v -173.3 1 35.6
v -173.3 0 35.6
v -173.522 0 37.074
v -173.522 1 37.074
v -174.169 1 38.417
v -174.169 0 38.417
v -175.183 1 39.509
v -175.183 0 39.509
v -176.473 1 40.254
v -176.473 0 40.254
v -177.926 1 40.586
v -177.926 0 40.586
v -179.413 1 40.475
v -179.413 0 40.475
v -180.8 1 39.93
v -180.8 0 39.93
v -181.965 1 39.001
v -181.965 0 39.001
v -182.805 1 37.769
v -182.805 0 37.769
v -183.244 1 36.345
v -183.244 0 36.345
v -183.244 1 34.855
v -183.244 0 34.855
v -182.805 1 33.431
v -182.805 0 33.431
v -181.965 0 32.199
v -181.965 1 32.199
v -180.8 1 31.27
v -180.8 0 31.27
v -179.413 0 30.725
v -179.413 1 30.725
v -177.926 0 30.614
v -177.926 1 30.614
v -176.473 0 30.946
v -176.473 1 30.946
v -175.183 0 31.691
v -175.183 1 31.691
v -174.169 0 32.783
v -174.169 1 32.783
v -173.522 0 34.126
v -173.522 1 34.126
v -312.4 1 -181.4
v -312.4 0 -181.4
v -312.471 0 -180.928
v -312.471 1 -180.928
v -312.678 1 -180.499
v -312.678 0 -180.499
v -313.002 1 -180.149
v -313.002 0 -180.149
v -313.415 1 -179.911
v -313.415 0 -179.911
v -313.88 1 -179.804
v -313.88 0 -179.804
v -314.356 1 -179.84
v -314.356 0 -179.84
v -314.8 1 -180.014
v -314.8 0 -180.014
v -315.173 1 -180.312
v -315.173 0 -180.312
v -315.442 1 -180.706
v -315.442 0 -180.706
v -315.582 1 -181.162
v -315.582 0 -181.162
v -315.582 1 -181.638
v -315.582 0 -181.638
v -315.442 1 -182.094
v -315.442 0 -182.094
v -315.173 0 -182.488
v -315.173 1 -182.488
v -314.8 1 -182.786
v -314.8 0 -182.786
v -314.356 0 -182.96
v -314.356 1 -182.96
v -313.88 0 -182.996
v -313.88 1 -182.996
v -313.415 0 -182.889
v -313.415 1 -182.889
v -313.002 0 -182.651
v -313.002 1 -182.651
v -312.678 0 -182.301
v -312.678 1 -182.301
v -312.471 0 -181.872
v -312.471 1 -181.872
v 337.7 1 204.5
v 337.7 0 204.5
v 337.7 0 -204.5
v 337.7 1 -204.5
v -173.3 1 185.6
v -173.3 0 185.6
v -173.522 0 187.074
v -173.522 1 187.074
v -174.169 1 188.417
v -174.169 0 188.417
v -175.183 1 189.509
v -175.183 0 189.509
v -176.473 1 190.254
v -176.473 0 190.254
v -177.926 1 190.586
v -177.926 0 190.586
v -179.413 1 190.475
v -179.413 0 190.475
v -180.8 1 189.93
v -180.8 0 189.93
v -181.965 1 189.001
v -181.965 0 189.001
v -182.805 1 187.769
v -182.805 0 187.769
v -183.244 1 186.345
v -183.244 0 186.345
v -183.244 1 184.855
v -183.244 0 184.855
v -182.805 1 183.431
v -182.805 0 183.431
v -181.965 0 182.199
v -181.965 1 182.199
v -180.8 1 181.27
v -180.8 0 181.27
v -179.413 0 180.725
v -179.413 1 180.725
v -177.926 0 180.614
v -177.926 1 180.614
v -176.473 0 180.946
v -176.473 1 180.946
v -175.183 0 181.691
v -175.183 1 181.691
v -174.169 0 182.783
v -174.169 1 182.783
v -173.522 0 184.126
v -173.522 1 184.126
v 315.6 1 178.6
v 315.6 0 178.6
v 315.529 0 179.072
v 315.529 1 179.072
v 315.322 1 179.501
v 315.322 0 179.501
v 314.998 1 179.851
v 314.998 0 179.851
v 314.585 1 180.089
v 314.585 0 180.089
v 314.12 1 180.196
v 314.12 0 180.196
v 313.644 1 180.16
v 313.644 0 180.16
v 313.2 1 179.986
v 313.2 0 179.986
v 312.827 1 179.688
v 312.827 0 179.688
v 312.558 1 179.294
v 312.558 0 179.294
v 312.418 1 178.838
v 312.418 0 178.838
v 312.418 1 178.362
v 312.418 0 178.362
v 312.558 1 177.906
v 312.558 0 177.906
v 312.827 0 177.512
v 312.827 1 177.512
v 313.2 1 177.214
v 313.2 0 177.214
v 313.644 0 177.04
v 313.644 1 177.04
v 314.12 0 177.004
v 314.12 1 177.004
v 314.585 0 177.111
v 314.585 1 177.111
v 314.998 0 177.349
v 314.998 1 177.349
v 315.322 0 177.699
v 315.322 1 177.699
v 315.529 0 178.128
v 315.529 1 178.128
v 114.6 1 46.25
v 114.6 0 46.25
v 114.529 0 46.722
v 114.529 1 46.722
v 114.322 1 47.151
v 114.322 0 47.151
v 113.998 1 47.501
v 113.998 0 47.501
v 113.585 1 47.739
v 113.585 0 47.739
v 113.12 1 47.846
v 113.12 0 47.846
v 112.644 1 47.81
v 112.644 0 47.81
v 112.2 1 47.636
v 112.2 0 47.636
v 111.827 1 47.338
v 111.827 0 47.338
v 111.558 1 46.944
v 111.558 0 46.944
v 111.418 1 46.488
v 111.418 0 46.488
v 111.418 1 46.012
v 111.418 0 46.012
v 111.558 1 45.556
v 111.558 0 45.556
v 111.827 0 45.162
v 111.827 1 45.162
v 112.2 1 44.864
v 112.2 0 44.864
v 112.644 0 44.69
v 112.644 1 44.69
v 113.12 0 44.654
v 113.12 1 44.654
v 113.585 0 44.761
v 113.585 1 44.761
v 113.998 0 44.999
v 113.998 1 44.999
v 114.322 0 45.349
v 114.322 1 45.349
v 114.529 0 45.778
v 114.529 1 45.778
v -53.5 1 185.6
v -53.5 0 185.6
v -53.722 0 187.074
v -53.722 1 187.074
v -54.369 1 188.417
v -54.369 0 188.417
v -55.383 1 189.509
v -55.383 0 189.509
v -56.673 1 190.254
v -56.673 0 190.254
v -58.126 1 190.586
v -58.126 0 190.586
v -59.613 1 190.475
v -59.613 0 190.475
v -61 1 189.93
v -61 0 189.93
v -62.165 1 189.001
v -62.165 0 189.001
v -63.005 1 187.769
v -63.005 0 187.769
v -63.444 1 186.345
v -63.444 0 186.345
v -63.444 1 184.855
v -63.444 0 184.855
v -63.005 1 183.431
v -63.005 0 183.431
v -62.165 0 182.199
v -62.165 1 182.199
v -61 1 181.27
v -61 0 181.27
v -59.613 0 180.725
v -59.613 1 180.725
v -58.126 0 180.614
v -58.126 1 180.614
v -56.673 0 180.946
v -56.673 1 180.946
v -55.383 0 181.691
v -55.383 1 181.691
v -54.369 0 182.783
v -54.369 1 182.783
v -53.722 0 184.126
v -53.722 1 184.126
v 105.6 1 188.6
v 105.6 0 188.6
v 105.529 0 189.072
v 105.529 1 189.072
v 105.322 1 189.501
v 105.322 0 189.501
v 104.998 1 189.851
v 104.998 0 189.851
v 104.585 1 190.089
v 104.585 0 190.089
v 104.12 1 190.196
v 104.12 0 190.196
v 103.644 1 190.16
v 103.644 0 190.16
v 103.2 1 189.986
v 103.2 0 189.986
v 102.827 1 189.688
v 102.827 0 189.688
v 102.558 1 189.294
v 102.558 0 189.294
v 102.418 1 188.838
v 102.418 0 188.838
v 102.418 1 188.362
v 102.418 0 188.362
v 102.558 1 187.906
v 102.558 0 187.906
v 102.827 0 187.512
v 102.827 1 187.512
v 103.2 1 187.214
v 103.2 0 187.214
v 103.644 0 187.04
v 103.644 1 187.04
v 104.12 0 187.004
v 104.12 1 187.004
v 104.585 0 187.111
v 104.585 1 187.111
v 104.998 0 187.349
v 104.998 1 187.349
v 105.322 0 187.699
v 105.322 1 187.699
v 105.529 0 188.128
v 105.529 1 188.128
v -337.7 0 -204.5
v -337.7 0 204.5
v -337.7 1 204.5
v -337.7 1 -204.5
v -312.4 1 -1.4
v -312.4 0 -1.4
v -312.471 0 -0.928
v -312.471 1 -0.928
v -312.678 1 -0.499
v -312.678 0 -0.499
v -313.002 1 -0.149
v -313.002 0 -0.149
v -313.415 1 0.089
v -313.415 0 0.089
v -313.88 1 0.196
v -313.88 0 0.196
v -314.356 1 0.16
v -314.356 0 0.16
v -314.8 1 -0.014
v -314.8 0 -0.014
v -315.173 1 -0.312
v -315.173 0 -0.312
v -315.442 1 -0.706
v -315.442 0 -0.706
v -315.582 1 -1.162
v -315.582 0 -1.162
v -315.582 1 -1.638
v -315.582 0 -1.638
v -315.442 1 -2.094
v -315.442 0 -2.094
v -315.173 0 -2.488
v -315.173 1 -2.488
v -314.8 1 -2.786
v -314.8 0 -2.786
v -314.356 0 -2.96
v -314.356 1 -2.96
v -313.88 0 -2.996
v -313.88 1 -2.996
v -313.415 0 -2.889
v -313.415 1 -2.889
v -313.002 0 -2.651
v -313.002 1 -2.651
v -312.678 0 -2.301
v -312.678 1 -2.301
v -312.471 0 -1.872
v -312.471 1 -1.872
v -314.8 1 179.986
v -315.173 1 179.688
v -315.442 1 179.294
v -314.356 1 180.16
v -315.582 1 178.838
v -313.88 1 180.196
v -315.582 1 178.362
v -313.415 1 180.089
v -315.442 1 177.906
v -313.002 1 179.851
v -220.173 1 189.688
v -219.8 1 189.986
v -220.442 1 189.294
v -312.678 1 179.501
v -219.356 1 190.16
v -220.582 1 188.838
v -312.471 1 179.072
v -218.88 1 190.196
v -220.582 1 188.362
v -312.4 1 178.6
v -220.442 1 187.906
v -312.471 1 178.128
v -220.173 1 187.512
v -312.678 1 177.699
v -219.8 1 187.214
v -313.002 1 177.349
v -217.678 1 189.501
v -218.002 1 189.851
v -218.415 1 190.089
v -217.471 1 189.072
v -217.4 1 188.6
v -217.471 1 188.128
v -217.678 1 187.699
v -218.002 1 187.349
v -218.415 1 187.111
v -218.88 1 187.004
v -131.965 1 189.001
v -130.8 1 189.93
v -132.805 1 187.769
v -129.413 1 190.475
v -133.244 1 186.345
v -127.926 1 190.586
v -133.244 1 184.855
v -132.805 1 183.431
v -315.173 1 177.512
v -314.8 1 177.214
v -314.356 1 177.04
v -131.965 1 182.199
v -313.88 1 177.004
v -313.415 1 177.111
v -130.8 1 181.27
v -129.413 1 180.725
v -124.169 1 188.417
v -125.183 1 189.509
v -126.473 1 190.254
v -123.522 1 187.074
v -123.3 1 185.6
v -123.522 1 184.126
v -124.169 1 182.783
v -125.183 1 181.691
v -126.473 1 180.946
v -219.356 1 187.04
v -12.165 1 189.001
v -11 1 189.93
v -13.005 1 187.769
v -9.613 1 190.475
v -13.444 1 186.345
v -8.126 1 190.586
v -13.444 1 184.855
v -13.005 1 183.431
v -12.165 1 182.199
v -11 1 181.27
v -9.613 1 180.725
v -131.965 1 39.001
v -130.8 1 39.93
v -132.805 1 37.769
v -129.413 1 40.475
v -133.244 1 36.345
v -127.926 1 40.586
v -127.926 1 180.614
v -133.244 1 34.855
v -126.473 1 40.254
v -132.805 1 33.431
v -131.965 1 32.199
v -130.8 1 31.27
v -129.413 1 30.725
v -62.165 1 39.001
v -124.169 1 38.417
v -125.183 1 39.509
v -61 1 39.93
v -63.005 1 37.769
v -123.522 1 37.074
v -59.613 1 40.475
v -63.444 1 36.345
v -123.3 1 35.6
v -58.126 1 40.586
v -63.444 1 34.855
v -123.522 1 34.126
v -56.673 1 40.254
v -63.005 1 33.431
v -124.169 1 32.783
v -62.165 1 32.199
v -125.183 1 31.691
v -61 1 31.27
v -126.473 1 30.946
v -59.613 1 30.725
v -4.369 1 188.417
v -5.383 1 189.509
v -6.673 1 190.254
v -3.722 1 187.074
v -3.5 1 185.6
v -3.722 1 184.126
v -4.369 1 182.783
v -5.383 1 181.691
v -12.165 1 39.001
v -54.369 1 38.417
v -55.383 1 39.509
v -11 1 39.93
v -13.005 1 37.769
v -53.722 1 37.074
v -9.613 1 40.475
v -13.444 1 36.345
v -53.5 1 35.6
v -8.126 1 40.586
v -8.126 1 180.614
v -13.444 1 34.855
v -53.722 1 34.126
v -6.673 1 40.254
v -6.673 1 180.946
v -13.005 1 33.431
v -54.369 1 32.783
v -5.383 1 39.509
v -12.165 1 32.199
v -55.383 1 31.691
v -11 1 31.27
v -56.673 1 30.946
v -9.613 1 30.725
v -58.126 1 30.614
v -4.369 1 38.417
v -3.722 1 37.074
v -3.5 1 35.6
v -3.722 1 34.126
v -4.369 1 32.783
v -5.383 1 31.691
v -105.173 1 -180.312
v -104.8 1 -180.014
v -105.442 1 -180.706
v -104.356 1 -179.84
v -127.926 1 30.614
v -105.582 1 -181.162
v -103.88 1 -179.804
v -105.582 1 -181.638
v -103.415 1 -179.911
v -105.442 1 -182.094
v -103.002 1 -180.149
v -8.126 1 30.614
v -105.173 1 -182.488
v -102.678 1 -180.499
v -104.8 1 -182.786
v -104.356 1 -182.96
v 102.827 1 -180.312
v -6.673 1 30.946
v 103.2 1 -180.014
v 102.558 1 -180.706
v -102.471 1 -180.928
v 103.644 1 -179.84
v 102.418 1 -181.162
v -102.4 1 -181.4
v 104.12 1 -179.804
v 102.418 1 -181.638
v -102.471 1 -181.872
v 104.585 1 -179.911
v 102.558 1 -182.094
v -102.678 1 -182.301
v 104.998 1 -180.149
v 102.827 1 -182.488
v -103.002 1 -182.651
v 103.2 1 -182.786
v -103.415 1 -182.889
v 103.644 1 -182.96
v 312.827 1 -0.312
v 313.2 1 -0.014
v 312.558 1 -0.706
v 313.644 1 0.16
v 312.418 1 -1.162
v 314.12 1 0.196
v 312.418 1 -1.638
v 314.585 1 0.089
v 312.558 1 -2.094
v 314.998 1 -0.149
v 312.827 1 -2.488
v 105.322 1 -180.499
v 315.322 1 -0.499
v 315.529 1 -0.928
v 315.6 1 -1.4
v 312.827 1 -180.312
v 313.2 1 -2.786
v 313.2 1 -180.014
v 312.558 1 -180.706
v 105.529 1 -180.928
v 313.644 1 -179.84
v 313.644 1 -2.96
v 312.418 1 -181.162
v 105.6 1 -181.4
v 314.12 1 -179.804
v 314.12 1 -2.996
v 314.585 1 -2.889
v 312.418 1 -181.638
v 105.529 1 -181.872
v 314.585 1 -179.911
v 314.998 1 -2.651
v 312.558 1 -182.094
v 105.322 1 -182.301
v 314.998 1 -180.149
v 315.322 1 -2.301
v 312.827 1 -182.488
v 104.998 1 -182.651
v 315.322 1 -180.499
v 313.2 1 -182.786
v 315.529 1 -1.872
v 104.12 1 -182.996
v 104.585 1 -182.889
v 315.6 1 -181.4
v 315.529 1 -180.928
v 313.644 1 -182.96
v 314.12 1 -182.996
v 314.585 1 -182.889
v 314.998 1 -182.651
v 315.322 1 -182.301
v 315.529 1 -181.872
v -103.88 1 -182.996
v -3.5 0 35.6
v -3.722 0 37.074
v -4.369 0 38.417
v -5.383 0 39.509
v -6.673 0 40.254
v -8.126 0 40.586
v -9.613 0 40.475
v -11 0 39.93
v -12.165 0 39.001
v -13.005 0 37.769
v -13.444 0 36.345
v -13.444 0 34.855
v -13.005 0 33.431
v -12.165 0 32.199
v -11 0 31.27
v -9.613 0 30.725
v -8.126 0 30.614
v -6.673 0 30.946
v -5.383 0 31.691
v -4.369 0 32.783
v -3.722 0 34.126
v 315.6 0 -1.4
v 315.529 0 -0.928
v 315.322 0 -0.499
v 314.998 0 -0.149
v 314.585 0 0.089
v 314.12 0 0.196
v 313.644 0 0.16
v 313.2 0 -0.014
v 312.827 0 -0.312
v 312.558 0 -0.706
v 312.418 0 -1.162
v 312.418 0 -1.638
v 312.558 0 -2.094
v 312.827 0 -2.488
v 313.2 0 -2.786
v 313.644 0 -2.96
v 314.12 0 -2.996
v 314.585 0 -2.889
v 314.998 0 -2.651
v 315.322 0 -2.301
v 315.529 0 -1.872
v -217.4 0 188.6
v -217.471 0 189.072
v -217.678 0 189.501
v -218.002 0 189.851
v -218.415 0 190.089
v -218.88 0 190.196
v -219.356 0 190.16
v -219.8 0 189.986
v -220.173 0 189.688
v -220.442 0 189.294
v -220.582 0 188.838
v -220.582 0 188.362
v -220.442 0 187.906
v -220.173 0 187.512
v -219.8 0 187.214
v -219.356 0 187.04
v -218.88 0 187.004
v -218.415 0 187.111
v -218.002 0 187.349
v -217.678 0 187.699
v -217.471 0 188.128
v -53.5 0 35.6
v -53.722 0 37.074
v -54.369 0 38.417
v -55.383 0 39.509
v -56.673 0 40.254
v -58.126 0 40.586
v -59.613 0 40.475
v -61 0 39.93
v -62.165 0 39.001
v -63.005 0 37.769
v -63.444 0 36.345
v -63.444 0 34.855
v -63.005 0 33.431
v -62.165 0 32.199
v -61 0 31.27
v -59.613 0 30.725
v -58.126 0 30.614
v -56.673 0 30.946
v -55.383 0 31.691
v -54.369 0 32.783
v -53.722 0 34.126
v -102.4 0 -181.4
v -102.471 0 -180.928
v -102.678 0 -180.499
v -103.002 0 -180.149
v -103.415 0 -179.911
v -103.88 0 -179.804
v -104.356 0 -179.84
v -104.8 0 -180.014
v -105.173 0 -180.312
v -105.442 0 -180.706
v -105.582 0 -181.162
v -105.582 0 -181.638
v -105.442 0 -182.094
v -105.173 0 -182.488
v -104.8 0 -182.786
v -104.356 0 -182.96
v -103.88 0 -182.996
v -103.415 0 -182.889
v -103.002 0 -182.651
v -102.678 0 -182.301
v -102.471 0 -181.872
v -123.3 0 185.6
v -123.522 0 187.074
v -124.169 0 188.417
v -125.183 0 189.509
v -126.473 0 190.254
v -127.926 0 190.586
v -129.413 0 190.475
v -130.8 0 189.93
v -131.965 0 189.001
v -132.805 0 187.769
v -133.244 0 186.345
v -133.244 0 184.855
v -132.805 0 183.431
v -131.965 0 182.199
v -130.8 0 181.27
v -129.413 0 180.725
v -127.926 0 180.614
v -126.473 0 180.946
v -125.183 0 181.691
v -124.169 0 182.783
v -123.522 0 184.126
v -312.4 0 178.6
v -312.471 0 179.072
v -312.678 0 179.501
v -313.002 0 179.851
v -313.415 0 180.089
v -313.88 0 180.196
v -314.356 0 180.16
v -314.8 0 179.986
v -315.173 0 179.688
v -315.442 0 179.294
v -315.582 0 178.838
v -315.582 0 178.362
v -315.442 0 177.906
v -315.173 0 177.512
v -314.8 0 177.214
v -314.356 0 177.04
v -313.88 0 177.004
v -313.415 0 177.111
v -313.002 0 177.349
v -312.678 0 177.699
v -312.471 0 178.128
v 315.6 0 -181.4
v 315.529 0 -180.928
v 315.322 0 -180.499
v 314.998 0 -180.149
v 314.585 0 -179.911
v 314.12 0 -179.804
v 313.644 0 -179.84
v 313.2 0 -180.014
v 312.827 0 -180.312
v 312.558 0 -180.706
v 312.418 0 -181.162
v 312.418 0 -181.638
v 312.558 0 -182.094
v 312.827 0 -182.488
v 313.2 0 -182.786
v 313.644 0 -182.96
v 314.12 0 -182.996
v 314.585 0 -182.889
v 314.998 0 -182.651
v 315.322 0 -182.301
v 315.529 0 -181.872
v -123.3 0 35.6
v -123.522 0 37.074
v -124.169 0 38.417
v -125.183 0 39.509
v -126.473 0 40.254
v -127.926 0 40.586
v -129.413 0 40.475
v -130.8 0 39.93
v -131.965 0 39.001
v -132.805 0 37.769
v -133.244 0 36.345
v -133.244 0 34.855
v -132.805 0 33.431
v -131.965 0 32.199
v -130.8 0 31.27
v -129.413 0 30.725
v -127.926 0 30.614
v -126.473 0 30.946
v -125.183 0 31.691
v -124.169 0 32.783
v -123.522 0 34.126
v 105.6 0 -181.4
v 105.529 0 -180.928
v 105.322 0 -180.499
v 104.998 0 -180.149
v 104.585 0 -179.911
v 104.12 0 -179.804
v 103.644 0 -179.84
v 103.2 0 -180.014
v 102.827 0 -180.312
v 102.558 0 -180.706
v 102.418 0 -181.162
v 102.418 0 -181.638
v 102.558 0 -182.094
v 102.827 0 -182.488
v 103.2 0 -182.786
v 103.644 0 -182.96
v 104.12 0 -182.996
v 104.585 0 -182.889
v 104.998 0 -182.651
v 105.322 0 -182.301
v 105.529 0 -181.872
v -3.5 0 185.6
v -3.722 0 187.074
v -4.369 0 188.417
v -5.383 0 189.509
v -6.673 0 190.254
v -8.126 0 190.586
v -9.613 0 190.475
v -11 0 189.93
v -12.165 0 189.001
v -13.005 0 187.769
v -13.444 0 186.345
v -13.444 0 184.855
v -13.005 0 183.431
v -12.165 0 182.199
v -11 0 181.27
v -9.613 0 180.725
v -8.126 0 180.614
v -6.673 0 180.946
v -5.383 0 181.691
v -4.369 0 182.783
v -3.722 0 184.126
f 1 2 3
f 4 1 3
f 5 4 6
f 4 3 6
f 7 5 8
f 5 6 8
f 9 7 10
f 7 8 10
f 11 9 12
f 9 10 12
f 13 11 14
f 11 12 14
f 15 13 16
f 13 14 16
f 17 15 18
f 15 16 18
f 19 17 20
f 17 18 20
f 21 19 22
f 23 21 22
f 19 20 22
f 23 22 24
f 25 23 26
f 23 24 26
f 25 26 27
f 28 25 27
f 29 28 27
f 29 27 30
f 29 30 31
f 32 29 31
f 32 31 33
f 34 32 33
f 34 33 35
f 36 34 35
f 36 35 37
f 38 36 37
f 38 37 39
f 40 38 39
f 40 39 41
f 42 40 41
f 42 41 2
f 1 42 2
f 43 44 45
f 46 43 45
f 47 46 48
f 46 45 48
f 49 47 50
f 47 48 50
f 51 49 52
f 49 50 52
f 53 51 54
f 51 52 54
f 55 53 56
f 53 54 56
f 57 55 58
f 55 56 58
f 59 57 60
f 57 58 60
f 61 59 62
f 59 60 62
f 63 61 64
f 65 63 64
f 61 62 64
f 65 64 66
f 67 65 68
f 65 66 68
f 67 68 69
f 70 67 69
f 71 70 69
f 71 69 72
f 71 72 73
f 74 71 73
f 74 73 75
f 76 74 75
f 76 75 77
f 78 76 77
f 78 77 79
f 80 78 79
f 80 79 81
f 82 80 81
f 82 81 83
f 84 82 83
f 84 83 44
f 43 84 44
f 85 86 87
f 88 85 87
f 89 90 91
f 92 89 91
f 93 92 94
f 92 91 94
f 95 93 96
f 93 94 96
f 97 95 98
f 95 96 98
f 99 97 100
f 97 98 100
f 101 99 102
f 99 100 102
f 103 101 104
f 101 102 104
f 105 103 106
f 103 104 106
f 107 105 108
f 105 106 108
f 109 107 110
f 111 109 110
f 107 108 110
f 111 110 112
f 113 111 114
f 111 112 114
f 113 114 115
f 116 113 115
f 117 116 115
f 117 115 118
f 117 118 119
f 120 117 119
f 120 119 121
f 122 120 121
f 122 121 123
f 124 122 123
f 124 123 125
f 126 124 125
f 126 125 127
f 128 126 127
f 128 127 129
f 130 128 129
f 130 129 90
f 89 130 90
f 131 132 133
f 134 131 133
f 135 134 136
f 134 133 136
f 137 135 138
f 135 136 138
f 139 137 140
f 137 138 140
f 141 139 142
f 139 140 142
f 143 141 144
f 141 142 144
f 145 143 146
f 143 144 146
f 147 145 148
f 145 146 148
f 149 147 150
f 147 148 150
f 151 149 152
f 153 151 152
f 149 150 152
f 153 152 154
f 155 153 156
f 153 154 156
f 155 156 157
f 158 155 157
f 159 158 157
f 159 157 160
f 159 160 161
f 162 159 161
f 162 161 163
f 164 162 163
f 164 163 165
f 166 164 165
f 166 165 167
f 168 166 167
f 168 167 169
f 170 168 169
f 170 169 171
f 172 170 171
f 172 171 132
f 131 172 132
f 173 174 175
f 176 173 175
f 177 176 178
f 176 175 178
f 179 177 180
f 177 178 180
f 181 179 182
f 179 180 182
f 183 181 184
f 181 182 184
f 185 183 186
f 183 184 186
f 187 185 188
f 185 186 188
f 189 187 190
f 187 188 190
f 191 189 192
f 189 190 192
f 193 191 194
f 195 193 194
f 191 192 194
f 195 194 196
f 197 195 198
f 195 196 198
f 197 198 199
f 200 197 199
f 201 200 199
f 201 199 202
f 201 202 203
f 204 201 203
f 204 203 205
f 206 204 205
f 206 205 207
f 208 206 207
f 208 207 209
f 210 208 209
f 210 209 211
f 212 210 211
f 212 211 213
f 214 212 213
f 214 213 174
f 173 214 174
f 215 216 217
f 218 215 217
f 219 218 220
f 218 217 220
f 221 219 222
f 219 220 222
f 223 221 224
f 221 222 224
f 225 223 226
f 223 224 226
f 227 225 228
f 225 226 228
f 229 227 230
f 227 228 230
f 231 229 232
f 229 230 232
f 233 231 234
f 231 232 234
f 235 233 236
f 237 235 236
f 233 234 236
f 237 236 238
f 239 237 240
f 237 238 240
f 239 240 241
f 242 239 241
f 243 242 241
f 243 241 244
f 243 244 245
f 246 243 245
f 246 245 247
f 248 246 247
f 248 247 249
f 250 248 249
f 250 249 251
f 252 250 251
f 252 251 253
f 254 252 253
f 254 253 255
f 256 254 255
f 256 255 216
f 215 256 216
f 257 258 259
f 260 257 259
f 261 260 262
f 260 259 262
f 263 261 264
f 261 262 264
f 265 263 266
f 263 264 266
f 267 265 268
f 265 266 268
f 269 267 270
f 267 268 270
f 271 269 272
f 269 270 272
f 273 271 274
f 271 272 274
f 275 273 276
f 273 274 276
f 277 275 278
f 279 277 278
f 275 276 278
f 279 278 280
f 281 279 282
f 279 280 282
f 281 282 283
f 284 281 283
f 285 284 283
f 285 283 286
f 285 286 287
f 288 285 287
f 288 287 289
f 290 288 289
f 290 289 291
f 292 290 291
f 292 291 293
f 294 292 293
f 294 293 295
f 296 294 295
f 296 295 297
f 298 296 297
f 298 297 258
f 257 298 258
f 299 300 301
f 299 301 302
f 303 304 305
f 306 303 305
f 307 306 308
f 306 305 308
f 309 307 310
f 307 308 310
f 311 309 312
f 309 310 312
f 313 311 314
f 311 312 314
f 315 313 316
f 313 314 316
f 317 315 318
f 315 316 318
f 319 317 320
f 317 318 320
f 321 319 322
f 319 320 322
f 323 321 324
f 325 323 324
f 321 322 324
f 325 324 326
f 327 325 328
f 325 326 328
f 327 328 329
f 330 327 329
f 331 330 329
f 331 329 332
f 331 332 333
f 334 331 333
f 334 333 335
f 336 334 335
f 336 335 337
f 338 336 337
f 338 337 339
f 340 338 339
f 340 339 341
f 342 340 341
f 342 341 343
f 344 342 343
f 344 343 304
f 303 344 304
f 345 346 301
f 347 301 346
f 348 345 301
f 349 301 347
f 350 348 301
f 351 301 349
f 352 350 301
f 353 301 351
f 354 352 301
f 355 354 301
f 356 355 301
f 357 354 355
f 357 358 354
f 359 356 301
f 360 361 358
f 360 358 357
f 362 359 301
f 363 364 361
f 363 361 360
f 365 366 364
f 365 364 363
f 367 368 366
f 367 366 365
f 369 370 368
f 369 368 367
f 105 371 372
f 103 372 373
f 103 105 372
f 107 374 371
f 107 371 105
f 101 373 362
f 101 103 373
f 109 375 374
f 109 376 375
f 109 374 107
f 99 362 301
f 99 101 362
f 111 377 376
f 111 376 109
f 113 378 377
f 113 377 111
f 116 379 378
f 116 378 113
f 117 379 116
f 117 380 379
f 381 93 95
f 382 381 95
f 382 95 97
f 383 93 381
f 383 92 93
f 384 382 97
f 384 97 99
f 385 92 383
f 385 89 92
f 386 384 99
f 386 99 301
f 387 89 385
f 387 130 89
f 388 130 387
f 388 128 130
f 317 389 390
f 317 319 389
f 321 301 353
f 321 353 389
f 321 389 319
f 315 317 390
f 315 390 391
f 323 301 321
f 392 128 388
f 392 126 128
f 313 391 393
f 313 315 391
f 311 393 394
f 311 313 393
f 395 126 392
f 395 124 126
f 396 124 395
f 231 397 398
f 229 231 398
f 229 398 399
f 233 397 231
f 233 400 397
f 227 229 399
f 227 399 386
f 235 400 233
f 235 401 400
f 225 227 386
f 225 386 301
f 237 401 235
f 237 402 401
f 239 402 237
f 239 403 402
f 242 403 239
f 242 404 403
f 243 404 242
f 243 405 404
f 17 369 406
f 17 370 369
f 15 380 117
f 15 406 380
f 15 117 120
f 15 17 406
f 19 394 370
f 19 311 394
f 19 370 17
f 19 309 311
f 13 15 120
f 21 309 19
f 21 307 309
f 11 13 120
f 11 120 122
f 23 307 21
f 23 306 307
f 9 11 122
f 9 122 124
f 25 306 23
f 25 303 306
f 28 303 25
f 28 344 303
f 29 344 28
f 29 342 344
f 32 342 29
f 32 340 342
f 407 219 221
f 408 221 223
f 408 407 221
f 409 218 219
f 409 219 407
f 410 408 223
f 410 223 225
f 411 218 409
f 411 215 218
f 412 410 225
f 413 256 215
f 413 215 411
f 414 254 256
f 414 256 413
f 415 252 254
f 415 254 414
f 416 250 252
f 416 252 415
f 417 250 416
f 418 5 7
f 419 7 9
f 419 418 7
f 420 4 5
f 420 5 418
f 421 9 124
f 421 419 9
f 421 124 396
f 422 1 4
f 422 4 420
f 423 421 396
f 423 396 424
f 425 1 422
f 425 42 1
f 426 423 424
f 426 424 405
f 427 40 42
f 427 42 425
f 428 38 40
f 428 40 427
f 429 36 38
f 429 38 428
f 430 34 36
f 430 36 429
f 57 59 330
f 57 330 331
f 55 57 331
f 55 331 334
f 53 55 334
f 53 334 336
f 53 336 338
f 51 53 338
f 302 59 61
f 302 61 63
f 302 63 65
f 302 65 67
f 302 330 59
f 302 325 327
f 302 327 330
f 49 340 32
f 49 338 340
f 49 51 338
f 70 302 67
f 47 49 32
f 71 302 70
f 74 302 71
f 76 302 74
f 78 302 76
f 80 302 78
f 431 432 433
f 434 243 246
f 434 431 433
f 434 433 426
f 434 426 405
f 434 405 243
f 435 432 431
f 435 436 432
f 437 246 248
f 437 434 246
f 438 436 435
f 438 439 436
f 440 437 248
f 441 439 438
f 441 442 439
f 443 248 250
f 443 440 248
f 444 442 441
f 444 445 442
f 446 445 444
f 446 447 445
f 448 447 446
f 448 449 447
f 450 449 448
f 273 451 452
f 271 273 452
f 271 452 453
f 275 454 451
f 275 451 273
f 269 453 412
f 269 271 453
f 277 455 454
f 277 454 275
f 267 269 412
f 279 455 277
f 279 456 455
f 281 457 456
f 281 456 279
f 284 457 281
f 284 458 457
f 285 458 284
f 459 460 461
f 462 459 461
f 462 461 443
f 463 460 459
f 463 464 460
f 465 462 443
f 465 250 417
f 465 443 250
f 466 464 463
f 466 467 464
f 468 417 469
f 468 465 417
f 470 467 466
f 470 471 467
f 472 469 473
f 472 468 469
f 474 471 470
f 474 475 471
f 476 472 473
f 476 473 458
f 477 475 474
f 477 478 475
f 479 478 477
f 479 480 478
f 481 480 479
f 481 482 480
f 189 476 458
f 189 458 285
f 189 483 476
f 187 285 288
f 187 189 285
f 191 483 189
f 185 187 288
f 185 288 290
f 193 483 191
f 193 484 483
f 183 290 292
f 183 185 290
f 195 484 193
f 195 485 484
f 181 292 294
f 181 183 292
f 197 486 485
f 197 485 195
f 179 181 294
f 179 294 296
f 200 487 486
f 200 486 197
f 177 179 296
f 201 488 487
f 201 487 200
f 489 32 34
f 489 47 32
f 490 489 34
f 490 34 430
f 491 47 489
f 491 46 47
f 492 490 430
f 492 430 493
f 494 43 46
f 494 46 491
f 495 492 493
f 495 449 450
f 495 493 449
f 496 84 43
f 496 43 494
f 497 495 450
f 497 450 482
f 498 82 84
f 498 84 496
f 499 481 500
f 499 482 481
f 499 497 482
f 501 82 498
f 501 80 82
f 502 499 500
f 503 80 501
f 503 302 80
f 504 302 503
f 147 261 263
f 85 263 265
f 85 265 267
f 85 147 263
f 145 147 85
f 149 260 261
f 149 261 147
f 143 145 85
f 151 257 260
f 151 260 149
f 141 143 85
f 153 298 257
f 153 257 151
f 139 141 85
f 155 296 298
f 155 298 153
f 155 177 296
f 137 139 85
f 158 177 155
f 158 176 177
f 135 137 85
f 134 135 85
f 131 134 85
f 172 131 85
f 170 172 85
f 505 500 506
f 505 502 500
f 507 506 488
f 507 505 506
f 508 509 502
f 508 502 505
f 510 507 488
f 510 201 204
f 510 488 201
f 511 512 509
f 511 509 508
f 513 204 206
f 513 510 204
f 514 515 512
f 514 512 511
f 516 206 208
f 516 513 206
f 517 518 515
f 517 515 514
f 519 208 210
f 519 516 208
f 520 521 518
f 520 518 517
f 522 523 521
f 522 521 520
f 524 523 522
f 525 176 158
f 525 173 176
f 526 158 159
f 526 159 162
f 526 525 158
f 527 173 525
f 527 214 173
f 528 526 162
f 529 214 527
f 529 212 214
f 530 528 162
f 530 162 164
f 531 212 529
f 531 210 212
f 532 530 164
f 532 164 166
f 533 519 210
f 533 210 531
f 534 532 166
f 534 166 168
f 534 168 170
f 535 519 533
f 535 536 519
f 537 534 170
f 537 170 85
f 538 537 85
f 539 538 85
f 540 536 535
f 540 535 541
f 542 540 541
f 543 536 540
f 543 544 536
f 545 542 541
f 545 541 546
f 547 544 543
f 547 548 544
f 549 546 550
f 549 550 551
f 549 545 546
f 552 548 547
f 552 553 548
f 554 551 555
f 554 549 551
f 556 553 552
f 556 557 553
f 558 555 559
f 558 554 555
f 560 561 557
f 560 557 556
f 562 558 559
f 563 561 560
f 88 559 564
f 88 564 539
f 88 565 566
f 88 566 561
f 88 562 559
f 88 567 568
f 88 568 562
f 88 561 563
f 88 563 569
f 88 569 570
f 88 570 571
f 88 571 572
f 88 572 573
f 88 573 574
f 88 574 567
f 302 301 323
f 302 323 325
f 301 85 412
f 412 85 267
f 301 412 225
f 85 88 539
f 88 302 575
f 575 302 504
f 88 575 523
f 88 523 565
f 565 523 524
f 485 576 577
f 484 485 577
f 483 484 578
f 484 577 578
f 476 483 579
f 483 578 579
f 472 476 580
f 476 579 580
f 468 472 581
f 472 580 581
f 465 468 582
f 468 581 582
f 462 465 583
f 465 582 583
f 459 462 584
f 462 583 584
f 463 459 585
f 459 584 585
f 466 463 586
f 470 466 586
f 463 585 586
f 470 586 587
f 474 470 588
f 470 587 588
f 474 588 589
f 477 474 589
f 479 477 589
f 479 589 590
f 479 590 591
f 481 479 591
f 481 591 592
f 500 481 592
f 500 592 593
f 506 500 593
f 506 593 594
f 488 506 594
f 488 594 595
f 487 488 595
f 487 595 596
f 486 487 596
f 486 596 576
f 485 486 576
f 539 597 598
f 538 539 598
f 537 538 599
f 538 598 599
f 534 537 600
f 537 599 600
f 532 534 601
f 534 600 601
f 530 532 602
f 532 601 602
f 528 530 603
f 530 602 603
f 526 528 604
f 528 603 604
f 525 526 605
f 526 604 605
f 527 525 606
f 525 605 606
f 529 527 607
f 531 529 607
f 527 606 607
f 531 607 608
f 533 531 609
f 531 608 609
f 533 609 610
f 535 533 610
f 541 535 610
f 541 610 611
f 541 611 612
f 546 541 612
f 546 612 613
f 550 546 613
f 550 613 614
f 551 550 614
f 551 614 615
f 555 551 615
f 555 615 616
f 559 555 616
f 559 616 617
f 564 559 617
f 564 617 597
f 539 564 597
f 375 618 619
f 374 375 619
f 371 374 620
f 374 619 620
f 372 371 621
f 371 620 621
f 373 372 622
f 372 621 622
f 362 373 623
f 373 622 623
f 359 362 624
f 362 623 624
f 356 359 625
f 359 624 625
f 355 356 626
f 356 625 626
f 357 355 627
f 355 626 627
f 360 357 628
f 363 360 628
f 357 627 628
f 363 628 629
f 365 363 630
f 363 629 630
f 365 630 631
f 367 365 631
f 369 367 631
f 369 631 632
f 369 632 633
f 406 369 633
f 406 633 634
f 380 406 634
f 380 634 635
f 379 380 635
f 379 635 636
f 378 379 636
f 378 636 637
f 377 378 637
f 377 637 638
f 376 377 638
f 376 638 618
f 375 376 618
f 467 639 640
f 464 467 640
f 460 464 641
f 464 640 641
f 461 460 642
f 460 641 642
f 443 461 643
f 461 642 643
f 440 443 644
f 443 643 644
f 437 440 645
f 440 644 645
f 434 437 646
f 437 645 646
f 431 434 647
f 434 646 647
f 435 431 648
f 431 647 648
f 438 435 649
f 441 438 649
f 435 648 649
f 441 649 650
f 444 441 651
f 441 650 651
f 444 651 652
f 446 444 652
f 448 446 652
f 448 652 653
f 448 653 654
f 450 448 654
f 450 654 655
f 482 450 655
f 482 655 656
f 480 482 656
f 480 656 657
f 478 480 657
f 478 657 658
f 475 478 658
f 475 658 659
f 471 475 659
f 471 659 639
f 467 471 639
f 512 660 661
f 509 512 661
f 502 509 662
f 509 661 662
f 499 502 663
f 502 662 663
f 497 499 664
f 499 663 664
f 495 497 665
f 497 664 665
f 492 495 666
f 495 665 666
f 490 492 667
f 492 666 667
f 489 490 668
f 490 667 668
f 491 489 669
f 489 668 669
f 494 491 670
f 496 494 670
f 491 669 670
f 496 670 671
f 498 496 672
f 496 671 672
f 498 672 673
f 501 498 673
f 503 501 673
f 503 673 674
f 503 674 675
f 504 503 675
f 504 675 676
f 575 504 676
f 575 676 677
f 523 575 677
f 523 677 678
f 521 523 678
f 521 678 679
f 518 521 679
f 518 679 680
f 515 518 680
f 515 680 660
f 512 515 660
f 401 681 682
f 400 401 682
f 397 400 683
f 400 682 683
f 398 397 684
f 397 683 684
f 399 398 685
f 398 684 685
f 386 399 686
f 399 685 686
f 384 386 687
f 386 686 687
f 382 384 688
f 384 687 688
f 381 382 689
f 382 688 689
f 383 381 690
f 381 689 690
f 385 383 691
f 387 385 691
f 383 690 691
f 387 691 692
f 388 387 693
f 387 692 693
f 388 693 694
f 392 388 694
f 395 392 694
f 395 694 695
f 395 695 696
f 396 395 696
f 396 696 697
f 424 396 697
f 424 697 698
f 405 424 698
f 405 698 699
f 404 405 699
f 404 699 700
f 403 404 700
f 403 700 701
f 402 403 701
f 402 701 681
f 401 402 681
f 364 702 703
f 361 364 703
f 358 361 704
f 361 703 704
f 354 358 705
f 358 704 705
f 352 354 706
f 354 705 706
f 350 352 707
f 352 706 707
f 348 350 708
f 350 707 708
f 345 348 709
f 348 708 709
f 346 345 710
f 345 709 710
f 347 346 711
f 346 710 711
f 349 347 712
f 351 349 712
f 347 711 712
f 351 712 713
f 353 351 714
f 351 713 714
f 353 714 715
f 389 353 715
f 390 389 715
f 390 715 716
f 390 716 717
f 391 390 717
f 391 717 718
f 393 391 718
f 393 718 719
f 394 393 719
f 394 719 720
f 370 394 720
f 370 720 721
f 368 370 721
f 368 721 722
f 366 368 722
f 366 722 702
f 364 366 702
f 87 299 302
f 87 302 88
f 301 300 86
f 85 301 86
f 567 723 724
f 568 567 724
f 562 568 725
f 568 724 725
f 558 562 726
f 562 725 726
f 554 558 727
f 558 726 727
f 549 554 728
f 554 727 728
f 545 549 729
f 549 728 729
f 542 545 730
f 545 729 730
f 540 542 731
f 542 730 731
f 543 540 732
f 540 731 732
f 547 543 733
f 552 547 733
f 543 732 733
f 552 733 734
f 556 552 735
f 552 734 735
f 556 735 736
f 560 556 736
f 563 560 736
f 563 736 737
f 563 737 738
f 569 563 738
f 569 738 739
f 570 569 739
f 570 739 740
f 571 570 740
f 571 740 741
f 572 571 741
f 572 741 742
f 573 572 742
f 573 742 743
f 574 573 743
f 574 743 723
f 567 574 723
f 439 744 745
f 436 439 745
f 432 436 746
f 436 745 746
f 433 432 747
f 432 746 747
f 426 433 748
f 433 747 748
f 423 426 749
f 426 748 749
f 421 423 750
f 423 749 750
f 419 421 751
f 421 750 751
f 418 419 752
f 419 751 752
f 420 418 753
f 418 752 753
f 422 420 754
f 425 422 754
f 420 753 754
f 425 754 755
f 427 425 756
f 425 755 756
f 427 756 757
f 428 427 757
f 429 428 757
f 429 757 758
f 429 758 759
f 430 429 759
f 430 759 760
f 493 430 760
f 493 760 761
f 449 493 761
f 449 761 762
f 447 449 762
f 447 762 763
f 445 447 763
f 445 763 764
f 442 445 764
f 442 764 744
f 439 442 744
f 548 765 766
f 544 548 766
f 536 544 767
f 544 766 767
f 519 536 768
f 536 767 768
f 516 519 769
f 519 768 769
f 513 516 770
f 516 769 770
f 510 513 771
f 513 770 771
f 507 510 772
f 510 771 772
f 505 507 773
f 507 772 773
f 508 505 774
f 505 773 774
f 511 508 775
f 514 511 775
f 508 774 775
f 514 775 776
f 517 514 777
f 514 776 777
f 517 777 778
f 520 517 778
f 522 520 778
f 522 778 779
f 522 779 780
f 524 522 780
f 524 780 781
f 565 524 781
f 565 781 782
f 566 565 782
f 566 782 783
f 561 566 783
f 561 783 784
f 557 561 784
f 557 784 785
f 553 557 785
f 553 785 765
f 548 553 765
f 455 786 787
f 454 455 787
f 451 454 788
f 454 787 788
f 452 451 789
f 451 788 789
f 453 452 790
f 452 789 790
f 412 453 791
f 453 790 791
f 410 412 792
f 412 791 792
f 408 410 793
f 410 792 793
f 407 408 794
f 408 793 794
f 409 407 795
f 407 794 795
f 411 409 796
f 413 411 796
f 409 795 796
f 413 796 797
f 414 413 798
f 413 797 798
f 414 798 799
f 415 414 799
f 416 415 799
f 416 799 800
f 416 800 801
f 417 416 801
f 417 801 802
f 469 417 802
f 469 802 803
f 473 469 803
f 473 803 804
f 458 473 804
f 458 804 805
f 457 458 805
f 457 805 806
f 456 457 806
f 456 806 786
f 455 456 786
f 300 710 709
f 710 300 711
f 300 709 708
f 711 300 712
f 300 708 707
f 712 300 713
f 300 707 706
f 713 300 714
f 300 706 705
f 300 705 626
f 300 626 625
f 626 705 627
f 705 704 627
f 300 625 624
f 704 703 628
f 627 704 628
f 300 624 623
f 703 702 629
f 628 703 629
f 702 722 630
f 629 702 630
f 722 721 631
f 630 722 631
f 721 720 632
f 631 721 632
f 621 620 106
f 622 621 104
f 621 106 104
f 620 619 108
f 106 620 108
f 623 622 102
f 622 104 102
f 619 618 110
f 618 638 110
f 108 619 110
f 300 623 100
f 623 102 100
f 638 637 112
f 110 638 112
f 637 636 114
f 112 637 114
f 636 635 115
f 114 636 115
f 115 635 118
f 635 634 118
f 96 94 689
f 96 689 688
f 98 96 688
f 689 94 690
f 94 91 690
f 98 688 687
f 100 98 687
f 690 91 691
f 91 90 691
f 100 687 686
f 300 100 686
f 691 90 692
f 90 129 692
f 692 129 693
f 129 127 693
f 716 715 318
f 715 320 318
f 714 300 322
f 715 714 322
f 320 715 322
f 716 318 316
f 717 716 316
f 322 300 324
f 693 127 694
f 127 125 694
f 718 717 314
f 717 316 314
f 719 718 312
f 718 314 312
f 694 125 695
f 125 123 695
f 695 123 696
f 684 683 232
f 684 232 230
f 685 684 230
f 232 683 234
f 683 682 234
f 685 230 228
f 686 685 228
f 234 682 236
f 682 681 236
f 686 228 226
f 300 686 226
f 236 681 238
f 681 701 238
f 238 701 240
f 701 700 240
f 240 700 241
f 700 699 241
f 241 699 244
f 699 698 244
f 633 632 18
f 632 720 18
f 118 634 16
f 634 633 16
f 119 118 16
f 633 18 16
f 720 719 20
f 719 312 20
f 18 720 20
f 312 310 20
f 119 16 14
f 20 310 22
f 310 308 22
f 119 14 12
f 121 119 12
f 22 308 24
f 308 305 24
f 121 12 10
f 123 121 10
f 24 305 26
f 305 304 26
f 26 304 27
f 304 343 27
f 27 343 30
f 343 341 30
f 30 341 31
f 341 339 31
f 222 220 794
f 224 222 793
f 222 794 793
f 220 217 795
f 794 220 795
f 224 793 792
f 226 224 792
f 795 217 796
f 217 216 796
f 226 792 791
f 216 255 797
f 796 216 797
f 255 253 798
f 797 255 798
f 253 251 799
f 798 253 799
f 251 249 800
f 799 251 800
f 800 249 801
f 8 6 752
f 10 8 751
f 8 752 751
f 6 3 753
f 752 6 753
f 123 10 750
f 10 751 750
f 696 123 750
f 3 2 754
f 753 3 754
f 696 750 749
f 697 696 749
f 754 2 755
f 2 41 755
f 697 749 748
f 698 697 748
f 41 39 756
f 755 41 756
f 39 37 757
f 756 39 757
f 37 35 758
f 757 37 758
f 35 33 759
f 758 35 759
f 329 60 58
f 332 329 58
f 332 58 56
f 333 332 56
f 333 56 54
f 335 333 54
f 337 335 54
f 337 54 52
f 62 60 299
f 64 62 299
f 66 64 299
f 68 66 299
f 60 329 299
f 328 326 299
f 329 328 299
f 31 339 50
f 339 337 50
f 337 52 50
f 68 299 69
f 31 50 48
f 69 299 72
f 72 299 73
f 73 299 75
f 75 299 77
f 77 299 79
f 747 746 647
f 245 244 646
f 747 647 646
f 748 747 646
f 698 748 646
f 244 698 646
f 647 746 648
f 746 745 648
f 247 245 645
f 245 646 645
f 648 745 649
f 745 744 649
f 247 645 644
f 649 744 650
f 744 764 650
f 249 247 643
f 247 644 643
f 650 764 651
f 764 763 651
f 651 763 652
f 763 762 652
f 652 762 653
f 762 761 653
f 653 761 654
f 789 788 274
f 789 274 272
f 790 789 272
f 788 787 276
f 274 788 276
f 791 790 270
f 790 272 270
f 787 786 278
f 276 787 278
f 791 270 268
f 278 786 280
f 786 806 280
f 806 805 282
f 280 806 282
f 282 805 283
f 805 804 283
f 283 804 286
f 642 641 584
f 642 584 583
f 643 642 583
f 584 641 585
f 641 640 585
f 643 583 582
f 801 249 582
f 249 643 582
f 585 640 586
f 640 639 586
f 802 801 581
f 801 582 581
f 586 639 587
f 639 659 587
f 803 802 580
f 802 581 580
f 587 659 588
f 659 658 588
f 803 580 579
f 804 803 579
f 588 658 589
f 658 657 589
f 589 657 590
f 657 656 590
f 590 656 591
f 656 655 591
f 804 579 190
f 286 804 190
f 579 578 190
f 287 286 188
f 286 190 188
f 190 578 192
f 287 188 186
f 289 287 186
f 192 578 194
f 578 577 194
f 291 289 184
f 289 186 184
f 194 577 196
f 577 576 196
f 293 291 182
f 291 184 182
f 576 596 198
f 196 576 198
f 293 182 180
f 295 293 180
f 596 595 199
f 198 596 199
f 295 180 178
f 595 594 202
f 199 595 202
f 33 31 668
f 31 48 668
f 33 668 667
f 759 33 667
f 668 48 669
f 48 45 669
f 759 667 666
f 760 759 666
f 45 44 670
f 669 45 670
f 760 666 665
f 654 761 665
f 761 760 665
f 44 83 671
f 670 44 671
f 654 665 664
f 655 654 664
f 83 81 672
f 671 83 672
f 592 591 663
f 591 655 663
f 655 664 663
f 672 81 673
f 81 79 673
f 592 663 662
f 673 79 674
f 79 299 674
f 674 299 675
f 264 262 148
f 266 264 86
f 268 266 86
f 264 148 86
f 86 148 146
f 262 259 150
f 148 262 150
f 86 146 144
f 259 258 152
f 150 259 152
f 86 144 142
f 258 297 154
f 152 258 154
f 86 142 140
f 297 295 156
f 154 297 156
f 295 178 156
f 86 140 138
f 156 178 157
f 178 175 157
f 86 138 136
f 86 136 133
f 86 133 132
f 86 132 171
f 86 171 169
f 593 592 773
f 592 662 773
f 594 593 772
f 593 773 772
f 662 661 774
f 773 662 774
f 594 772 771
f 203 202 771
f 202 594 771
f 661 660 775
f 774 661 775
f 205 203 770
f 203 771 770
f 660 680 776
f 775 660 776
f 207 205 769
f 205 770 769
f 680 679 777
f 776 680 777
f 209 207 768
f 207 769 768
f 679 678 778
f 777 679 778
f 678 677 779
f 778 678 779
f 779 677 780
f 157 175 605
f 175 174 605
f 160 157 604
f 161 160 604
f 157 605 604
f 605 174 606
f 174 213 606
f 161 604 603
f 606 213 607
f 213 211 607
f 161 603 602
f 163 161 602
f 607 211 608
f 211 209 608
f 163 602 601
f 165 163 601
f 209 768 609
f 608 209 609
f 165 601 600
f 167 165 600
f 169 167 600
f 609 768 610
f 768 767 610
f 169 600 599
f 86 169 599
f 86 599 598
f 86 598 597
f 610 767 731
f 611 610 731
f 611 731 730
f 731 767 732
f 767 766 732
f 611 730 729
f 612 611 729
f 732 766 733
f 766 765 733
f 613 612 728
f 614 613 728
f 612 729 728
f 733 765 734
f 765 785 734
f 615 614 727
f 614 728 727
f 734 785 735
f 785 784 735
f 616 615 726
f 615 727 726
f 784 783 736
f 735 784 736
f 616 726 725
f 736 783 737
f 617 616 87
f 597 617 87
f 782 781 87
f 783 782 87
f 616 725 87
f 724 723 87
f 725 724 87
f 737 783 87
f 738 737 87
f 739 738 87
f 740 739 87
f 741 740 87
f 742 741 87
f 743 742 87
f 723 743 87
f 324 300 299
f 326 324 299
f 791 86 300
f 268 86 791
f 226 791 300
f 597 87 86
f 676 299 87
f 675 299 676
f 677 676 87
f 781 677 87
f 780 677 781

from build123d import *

# Parameters (mm, degrees)
CROQUIS1_W              = 675.4
CROQUIS1_H              = 409
SALIENTE_EXTRUIR1_DEPTH = 1
CORTAR_EXTRUIR1_REACH   = 3
CROQUIS2_R              = 1.6
CORTAR_EXTRUIR2_REACH   = 3
CROQUIS3_R              = 5
CORTAR_EXTRUIR3_REACH   = 3
CROQUIS4_R              = 1.6


with BuildPart() as part:
    # Croquis1 → Saliente-Extruir1 (new body)
    with BuildSketch(Plane(origin=(0, 0, 0), x_dir=(1, 0, 0), z_dir=(0, 1, 0))):
        Rectangle(CROQUIS1_W, CROQUIS1_H)
    extrude(amount=SALIENTE_EXTRUIR1_DEPTH)

    # Croquis2 → Cortar-Extruir1 (cut, up to next)
    with BuildSketch(Plane.XZ, mode=Mode.PRIVATE) as cortar_extruir1_sk1:
        with Locations((-314, 178.6)):
            Circle(CROQUIS2_R)
    cortar_extruir1_tool1 = extrude(cortar_extruir1_sk1.sketch, amount=-CORTAR_EXTRUIR1_REACH, mode=Mode.PRIVATE) & part.part
    add(cortar_extruir1_tool1.solids().sort_by_distance((-314, 0, 178.6))[0], mode=Mode.SUBTRACT)
    # Croquis2 → Cortar-Extruir1 (cut, up to next)
    with BuildSketch(Plane.XZ, mode=Mode.PRIVATE) as cortar_extruir1_sk2:
        with Locations((-314, -181.4)):
            Circle(CROQUIS2_R)
    cortar_extruir1_tool2 = extrude(cortar_extruir1_sk2.sketch, amount=-CORTAR_EXTRUIR1_REACH, mode=Mode.PRIVATE) & part.part
    add(cortar_extruir1_tool2.solids().sort_by_distance((-314, 0, -181.4))[0], mode=Mode.SUBTRACT)
    # Croquis2 → Cortar-Extruir1 (cut, up to next)
    with BuildSketch(Plane.XZ, mode=Mode.PRIVATE) as cortar_extruir1_sk3:
        with Locations((314, -181.4)):
            Circle(CROQUIS2_R)
    cortar_extruir1_tool3 = extrude(cortar_extruir1_sk3.sketch, amount=-CORTAR_EXTRUIR1_REACH, mode=Mode.PRIVATE) & part.part
    add(cortar_extruir1_tool3.solids().sort_by_distance((314, 0, -181.4))[0], mode=Mode.SUBTRACT)
    # Croquis2 → Cortar-Extruir1 (cut, up to next)
    with BuildSketch(Plane.XZ, mode=Mode.PRIVATE) as cortar_extruir1_sk4:
        with Locations((314, 178.6)):
            Circle(CROQUIS2_R)
    cortar_extruir1_tool4 = extrude(cortar_extruir1_sk4.sketch, amount=-CORTAR_EXTRUIR1_REACH, mode=Mode.PRIVATE) & part.part
    add(cortar_extruir1_tool4.solids().sort_by_distance((314, 0, 178.6))[0], mode=Mode.SUBTRACT)
    # Croquis2 → Cortar-Extruir1 (cut, up to next)
    with BuildSketch(Plane.XZ, mode=Mode.PRIVATE) as cortar_extruir1_sk5:
        with Locations((113, 46.25)):
            Circle(CROQUIS2_R)
    cortar_extruir1_tool5 = extrude(cortar_extruir1_sk5.sketch, amount=-CORTAR_EXTRUIR1_REACH, mode=Mode.PRIVATE) & part.part
    add(cortar_extruir1_tool5.solids().sort_by_distance((113, 0, 46.25))[0], mode=Mode.SUBTRACT)

    # Croquis3 → Cortar-Extruir2 (cut, up to next)
    with BuildSketch(Plane.XZ, mode=Mode.PRIVATE) as cortar_extruir2_sk1:
        with Locations((-58.5, 35.6)):
            Circle(CROQUIS3_R)
    cortar_extruir2_tool1 = extrude(cortar_extruir2_sk1.sketch, amount=-CORTAR_EXTRUIR2_REACH, mode=Mode.PRIVATE) & part.part
    add(cortar_extruir2_tool1.solids().sort_by_distance((-58.5, 0, 35.6))[0], mode=Mode.SUBTRACT)
    # Croquis3 → Cortar-Extruir2 (cut, up to next)
    with BuildSketch(Plane.XZ, mode=Mode.PRIVATE) as cortar_extruir2_sk2:
        with Locations((-8.5, 35.6)):
            Circle(CROQUIS3_R)
    cortar_extruir2_tool2 = extrude(cortar_extruir2_sk2.sketch, amount=-CORTAR_EXTRUIR2_REACH, mode=Mode.PRIVATE) & part.part
    add(cortar_extruir2_tool2.solids().sort_by_distance((-8.5, 0, 35.6))[0], mode=Mode.SUBTRACT)
    # Croquis3 → Cortar-Extruir2 (cut, up to next)
    with BuildSketch(Plane.XZ, mode=Mode.PRIVATE) as cortar_extruir2_sk3:
        with Locations((-8.5, 185.6)):
            Circle(CROQUIS3_R)
    cortar_extruir2_tool3 = extrude(cortar_extruir2_sk3.sketch, amount=-CORTAR_EXTRUIR2_REACH, mode=Mode.PRIVATE) & part.part
    add(cortar_extruir2_tool3.solids().sort_by_distance((-8.5, 0, 185.6))[0], mode=Mode.SUBTRACT)
    # Croquis3 → Cortar-Extruir2 (cut, up to next)
    with BuildSketch(Plane.XZ, mode=Mode.PRIVATE) as cortar_extruir2_sk4:
        with Locations((-58.5, 185.6)):
            Circle(CROQUIS3_R)
    cortar_extruir2_tool4 = extrude(cortar_extruir2_sk4.sketch, amount=-CORTAR_EXTRUIR2_REACH, mode=Mode.PRIVATE) & part.part
    add(cortar_extruir2_tool4.solids().sort_by_distance((-58.5, 0, 185.6))[0], mode=Mode.SUBTRACT)
    # Croquis3 → Cortar-Extruir2 (cut, up to next)
    with BuildSketch(Plane.XZ, mode=Mode.PRIVATE) as cortar_extruir2_sk5:
        with Locations((-128.3, 185.6)):
            Circle(CROQUIS3_R)
    cortar_extruir2_tool5 = extrude(cortar_extruir2_sk5.sketch, amount=-CORTAR_EXTRUIR2_REACH, mode=Mode.PRIVATE) & part.part
    add(cortar_extruir2_tool5.solids().sort_by_distance((-128.3, 0, 185.6))[0], mode=Mode.SUBTRACT)
    # Croquis3 → Cortar-Extruir2 (cut, up to next)
    with BuildSketch(Plane.XZ, mode=Mode.PRIVATE) as cortar_extruir2_sk6:
        with Locations((-178.3, 185.6)):
            Circle(CROQUIS3_R)
    cortar_extruir2_tool6 = extrude(cortar_extruir2_sk6.sketch, amount=-CORTAR_EXTRUIR2_REACH, mode=Mode.PRIVATE) & part.part
    add(cortar_extruir2_tool6.solids().sort_by_distance((-178.3, 0, 185.6))[0], mode=Mode.SUBTRACT)
    # Croquis3 → Cortar-Extruir2 (cut, up to next)
    with BuildSketch(Plane.XZ, mode=Mode.PRIVATE) as cortar_extruir2_sk7:
        with Locations((-178.3, 35.6)):
            Circle(CROQUIS3_R)
    cortar_extruir2_tool7 = extrude(cortar_extruir2_sk7.sketch, amount=-CORTAR_EXTRUIR2_REACH, mode=Mode.PRIVATE) & part.part
    add(cortar_extruir2_tool7.solids().sort_by_distance((-178.3, 0, 35.6))[0], mode=Mode.SUBTRACT)
    # Croquis3 → Cortar-Extruir2 (cut, up to next)
    with BuildSketch(Plane.XZ, mode=Mode.PRIVATE) as cortar_extruir2_sk8:
        with Locations((-128.3, 35.6)):
            Circle(CROQUIS3_R)
    cortar_extruir2_tool8 = extrude(cortar_extruir2_sk8.sketch, amount=-CORTAR_EXTRUIR2_REACH, mode=Mode.PRIVATE) & part.part
    add(cortar_extruir2_tool8.solids().sort_by_distance((-128.3, 0, 35.6))[0], mode=Mode.SUBTRACT)

    # Croquis4 → Cortar-Extruir3 (cut, up to next)
    with BuildSketch(Plane.XZ, mode=Mode.PRIVATE) as cortar_extruir3_sk1:
        with Locations((-314, -1.4)):
            Circle(CROQUIS4_R)
    cortar_extruir3_tool1 = extrude(cortar_extruir3_sk1.sketch, amount=-CORTAR_EXTRUIR3_REACH, mode=Mode.PRIVATE) & part.part
    add(cortar_extruir3_tool1.solids().sort_by_distance((-314, 0, -1.4))[0], mode=Mode.SUBTRACT)
    # Croquis4 → Cortar-Extruir3 (cut, up to next)
    with BuildSketch(Plane.XZ, mode=Mode.PRIVATE) as cortar_extruir3_sk2:
        with Locations((314, -1.4)):
            Circle(CROQUIS4_R)
    cortar_extruir3_tool2 = extrude(cortar_extruir3_sk2.sketch, amount=-CORTAR_EXTRUIR3_REACH, mode=Mode.PRIVATE) & part.part
    add(cortar_extruir3_tool2.solids().sort_by_distance((314, 0, -1.4))[0], mode=Mode.SUBTRACT)
    # Croquis4 → Cortar-Extruir3 (cut, up to next)
    with BuildSketch(Plane.XZ, mode=Mode.PRIVATE) as cortar_extruir3_sk3:
        with Locations((-219, 188.6)):
            Circle(CROQUIS4_R)
    cortar_extruir3_tool3 = extrude(cortar_extruir3_sk3.sketch, amount=-CORTAR_EXTRUIR3_REACH, mode=Mode.PRIVATE) & part.part
    add(cortar_extruir3_tool3.solids().sort_by_distance((-219, 0, 188.6))[0], mode=Mode.SUBTRACT)
    # Croquis4 → Cortar-Extruir3 (cut, up to next)
    with BuildSketch(Plane.XZ, mode=Mode.PRIVATE) as cortar_extruir3_sk4:
        with Locations((104, -181.4)):
            Circle(CROQUIS4_R)
    cortar_extruir3_tool4 = extrude(cortar_extruir3_sk4.sketch, amount=-CORTAR_EXTRUIR3_REACH, mode=Mode.PRIVATE) & part.part
    add(cortar_extruir3_tool4.solids().sort_by_distance((104, 0, -181.4))[0], mode=Mode.SUBTRACT)
    # Croquis4 → Cortar-Extruir3 (cut, up to next)
    with BuildSketch(Plane.XZ, mode=Mode.PRIVATE) as cortar_extruir3_sk5:
        with Locations((104, 188.6)):
            Circle(CROQUIS4_R)
    cortar_extruir3_tool5 = extrude(cortar_extruir3_sk5.sketch, amount=-CORTAR_EXTRUIR3_REACH, mode=Mode.PRIVATE) & part.part
    add(cortar_extruir3_tool5.solids().sort_by_distance((104, 0, 188.6))[0], mode=Mode.SUBTRACT)
    # Croquis4 → Cortar-Extruir3 (cut, up to next)
    with BuildSketch(Plane.XZ, mode=Mode.PRIVATE) as cortar_extruir3_sk6:
        with Locations((-104, -181.4)):
            Circle(CROQUIS4_R)
    cortar_extruir3_tool6 = extrude(cortar_extruir3_sk6.sketch, amount=-CORTAR_EXTRUIR3_REACH, mode=Mode.PRIVATE) & part.part
    add(cortar_extruir3_tool6.solids().sort_by_distance((-104, 0, -181.4))[0], mode=Mode.SUBTRACT)


solid = part.part
